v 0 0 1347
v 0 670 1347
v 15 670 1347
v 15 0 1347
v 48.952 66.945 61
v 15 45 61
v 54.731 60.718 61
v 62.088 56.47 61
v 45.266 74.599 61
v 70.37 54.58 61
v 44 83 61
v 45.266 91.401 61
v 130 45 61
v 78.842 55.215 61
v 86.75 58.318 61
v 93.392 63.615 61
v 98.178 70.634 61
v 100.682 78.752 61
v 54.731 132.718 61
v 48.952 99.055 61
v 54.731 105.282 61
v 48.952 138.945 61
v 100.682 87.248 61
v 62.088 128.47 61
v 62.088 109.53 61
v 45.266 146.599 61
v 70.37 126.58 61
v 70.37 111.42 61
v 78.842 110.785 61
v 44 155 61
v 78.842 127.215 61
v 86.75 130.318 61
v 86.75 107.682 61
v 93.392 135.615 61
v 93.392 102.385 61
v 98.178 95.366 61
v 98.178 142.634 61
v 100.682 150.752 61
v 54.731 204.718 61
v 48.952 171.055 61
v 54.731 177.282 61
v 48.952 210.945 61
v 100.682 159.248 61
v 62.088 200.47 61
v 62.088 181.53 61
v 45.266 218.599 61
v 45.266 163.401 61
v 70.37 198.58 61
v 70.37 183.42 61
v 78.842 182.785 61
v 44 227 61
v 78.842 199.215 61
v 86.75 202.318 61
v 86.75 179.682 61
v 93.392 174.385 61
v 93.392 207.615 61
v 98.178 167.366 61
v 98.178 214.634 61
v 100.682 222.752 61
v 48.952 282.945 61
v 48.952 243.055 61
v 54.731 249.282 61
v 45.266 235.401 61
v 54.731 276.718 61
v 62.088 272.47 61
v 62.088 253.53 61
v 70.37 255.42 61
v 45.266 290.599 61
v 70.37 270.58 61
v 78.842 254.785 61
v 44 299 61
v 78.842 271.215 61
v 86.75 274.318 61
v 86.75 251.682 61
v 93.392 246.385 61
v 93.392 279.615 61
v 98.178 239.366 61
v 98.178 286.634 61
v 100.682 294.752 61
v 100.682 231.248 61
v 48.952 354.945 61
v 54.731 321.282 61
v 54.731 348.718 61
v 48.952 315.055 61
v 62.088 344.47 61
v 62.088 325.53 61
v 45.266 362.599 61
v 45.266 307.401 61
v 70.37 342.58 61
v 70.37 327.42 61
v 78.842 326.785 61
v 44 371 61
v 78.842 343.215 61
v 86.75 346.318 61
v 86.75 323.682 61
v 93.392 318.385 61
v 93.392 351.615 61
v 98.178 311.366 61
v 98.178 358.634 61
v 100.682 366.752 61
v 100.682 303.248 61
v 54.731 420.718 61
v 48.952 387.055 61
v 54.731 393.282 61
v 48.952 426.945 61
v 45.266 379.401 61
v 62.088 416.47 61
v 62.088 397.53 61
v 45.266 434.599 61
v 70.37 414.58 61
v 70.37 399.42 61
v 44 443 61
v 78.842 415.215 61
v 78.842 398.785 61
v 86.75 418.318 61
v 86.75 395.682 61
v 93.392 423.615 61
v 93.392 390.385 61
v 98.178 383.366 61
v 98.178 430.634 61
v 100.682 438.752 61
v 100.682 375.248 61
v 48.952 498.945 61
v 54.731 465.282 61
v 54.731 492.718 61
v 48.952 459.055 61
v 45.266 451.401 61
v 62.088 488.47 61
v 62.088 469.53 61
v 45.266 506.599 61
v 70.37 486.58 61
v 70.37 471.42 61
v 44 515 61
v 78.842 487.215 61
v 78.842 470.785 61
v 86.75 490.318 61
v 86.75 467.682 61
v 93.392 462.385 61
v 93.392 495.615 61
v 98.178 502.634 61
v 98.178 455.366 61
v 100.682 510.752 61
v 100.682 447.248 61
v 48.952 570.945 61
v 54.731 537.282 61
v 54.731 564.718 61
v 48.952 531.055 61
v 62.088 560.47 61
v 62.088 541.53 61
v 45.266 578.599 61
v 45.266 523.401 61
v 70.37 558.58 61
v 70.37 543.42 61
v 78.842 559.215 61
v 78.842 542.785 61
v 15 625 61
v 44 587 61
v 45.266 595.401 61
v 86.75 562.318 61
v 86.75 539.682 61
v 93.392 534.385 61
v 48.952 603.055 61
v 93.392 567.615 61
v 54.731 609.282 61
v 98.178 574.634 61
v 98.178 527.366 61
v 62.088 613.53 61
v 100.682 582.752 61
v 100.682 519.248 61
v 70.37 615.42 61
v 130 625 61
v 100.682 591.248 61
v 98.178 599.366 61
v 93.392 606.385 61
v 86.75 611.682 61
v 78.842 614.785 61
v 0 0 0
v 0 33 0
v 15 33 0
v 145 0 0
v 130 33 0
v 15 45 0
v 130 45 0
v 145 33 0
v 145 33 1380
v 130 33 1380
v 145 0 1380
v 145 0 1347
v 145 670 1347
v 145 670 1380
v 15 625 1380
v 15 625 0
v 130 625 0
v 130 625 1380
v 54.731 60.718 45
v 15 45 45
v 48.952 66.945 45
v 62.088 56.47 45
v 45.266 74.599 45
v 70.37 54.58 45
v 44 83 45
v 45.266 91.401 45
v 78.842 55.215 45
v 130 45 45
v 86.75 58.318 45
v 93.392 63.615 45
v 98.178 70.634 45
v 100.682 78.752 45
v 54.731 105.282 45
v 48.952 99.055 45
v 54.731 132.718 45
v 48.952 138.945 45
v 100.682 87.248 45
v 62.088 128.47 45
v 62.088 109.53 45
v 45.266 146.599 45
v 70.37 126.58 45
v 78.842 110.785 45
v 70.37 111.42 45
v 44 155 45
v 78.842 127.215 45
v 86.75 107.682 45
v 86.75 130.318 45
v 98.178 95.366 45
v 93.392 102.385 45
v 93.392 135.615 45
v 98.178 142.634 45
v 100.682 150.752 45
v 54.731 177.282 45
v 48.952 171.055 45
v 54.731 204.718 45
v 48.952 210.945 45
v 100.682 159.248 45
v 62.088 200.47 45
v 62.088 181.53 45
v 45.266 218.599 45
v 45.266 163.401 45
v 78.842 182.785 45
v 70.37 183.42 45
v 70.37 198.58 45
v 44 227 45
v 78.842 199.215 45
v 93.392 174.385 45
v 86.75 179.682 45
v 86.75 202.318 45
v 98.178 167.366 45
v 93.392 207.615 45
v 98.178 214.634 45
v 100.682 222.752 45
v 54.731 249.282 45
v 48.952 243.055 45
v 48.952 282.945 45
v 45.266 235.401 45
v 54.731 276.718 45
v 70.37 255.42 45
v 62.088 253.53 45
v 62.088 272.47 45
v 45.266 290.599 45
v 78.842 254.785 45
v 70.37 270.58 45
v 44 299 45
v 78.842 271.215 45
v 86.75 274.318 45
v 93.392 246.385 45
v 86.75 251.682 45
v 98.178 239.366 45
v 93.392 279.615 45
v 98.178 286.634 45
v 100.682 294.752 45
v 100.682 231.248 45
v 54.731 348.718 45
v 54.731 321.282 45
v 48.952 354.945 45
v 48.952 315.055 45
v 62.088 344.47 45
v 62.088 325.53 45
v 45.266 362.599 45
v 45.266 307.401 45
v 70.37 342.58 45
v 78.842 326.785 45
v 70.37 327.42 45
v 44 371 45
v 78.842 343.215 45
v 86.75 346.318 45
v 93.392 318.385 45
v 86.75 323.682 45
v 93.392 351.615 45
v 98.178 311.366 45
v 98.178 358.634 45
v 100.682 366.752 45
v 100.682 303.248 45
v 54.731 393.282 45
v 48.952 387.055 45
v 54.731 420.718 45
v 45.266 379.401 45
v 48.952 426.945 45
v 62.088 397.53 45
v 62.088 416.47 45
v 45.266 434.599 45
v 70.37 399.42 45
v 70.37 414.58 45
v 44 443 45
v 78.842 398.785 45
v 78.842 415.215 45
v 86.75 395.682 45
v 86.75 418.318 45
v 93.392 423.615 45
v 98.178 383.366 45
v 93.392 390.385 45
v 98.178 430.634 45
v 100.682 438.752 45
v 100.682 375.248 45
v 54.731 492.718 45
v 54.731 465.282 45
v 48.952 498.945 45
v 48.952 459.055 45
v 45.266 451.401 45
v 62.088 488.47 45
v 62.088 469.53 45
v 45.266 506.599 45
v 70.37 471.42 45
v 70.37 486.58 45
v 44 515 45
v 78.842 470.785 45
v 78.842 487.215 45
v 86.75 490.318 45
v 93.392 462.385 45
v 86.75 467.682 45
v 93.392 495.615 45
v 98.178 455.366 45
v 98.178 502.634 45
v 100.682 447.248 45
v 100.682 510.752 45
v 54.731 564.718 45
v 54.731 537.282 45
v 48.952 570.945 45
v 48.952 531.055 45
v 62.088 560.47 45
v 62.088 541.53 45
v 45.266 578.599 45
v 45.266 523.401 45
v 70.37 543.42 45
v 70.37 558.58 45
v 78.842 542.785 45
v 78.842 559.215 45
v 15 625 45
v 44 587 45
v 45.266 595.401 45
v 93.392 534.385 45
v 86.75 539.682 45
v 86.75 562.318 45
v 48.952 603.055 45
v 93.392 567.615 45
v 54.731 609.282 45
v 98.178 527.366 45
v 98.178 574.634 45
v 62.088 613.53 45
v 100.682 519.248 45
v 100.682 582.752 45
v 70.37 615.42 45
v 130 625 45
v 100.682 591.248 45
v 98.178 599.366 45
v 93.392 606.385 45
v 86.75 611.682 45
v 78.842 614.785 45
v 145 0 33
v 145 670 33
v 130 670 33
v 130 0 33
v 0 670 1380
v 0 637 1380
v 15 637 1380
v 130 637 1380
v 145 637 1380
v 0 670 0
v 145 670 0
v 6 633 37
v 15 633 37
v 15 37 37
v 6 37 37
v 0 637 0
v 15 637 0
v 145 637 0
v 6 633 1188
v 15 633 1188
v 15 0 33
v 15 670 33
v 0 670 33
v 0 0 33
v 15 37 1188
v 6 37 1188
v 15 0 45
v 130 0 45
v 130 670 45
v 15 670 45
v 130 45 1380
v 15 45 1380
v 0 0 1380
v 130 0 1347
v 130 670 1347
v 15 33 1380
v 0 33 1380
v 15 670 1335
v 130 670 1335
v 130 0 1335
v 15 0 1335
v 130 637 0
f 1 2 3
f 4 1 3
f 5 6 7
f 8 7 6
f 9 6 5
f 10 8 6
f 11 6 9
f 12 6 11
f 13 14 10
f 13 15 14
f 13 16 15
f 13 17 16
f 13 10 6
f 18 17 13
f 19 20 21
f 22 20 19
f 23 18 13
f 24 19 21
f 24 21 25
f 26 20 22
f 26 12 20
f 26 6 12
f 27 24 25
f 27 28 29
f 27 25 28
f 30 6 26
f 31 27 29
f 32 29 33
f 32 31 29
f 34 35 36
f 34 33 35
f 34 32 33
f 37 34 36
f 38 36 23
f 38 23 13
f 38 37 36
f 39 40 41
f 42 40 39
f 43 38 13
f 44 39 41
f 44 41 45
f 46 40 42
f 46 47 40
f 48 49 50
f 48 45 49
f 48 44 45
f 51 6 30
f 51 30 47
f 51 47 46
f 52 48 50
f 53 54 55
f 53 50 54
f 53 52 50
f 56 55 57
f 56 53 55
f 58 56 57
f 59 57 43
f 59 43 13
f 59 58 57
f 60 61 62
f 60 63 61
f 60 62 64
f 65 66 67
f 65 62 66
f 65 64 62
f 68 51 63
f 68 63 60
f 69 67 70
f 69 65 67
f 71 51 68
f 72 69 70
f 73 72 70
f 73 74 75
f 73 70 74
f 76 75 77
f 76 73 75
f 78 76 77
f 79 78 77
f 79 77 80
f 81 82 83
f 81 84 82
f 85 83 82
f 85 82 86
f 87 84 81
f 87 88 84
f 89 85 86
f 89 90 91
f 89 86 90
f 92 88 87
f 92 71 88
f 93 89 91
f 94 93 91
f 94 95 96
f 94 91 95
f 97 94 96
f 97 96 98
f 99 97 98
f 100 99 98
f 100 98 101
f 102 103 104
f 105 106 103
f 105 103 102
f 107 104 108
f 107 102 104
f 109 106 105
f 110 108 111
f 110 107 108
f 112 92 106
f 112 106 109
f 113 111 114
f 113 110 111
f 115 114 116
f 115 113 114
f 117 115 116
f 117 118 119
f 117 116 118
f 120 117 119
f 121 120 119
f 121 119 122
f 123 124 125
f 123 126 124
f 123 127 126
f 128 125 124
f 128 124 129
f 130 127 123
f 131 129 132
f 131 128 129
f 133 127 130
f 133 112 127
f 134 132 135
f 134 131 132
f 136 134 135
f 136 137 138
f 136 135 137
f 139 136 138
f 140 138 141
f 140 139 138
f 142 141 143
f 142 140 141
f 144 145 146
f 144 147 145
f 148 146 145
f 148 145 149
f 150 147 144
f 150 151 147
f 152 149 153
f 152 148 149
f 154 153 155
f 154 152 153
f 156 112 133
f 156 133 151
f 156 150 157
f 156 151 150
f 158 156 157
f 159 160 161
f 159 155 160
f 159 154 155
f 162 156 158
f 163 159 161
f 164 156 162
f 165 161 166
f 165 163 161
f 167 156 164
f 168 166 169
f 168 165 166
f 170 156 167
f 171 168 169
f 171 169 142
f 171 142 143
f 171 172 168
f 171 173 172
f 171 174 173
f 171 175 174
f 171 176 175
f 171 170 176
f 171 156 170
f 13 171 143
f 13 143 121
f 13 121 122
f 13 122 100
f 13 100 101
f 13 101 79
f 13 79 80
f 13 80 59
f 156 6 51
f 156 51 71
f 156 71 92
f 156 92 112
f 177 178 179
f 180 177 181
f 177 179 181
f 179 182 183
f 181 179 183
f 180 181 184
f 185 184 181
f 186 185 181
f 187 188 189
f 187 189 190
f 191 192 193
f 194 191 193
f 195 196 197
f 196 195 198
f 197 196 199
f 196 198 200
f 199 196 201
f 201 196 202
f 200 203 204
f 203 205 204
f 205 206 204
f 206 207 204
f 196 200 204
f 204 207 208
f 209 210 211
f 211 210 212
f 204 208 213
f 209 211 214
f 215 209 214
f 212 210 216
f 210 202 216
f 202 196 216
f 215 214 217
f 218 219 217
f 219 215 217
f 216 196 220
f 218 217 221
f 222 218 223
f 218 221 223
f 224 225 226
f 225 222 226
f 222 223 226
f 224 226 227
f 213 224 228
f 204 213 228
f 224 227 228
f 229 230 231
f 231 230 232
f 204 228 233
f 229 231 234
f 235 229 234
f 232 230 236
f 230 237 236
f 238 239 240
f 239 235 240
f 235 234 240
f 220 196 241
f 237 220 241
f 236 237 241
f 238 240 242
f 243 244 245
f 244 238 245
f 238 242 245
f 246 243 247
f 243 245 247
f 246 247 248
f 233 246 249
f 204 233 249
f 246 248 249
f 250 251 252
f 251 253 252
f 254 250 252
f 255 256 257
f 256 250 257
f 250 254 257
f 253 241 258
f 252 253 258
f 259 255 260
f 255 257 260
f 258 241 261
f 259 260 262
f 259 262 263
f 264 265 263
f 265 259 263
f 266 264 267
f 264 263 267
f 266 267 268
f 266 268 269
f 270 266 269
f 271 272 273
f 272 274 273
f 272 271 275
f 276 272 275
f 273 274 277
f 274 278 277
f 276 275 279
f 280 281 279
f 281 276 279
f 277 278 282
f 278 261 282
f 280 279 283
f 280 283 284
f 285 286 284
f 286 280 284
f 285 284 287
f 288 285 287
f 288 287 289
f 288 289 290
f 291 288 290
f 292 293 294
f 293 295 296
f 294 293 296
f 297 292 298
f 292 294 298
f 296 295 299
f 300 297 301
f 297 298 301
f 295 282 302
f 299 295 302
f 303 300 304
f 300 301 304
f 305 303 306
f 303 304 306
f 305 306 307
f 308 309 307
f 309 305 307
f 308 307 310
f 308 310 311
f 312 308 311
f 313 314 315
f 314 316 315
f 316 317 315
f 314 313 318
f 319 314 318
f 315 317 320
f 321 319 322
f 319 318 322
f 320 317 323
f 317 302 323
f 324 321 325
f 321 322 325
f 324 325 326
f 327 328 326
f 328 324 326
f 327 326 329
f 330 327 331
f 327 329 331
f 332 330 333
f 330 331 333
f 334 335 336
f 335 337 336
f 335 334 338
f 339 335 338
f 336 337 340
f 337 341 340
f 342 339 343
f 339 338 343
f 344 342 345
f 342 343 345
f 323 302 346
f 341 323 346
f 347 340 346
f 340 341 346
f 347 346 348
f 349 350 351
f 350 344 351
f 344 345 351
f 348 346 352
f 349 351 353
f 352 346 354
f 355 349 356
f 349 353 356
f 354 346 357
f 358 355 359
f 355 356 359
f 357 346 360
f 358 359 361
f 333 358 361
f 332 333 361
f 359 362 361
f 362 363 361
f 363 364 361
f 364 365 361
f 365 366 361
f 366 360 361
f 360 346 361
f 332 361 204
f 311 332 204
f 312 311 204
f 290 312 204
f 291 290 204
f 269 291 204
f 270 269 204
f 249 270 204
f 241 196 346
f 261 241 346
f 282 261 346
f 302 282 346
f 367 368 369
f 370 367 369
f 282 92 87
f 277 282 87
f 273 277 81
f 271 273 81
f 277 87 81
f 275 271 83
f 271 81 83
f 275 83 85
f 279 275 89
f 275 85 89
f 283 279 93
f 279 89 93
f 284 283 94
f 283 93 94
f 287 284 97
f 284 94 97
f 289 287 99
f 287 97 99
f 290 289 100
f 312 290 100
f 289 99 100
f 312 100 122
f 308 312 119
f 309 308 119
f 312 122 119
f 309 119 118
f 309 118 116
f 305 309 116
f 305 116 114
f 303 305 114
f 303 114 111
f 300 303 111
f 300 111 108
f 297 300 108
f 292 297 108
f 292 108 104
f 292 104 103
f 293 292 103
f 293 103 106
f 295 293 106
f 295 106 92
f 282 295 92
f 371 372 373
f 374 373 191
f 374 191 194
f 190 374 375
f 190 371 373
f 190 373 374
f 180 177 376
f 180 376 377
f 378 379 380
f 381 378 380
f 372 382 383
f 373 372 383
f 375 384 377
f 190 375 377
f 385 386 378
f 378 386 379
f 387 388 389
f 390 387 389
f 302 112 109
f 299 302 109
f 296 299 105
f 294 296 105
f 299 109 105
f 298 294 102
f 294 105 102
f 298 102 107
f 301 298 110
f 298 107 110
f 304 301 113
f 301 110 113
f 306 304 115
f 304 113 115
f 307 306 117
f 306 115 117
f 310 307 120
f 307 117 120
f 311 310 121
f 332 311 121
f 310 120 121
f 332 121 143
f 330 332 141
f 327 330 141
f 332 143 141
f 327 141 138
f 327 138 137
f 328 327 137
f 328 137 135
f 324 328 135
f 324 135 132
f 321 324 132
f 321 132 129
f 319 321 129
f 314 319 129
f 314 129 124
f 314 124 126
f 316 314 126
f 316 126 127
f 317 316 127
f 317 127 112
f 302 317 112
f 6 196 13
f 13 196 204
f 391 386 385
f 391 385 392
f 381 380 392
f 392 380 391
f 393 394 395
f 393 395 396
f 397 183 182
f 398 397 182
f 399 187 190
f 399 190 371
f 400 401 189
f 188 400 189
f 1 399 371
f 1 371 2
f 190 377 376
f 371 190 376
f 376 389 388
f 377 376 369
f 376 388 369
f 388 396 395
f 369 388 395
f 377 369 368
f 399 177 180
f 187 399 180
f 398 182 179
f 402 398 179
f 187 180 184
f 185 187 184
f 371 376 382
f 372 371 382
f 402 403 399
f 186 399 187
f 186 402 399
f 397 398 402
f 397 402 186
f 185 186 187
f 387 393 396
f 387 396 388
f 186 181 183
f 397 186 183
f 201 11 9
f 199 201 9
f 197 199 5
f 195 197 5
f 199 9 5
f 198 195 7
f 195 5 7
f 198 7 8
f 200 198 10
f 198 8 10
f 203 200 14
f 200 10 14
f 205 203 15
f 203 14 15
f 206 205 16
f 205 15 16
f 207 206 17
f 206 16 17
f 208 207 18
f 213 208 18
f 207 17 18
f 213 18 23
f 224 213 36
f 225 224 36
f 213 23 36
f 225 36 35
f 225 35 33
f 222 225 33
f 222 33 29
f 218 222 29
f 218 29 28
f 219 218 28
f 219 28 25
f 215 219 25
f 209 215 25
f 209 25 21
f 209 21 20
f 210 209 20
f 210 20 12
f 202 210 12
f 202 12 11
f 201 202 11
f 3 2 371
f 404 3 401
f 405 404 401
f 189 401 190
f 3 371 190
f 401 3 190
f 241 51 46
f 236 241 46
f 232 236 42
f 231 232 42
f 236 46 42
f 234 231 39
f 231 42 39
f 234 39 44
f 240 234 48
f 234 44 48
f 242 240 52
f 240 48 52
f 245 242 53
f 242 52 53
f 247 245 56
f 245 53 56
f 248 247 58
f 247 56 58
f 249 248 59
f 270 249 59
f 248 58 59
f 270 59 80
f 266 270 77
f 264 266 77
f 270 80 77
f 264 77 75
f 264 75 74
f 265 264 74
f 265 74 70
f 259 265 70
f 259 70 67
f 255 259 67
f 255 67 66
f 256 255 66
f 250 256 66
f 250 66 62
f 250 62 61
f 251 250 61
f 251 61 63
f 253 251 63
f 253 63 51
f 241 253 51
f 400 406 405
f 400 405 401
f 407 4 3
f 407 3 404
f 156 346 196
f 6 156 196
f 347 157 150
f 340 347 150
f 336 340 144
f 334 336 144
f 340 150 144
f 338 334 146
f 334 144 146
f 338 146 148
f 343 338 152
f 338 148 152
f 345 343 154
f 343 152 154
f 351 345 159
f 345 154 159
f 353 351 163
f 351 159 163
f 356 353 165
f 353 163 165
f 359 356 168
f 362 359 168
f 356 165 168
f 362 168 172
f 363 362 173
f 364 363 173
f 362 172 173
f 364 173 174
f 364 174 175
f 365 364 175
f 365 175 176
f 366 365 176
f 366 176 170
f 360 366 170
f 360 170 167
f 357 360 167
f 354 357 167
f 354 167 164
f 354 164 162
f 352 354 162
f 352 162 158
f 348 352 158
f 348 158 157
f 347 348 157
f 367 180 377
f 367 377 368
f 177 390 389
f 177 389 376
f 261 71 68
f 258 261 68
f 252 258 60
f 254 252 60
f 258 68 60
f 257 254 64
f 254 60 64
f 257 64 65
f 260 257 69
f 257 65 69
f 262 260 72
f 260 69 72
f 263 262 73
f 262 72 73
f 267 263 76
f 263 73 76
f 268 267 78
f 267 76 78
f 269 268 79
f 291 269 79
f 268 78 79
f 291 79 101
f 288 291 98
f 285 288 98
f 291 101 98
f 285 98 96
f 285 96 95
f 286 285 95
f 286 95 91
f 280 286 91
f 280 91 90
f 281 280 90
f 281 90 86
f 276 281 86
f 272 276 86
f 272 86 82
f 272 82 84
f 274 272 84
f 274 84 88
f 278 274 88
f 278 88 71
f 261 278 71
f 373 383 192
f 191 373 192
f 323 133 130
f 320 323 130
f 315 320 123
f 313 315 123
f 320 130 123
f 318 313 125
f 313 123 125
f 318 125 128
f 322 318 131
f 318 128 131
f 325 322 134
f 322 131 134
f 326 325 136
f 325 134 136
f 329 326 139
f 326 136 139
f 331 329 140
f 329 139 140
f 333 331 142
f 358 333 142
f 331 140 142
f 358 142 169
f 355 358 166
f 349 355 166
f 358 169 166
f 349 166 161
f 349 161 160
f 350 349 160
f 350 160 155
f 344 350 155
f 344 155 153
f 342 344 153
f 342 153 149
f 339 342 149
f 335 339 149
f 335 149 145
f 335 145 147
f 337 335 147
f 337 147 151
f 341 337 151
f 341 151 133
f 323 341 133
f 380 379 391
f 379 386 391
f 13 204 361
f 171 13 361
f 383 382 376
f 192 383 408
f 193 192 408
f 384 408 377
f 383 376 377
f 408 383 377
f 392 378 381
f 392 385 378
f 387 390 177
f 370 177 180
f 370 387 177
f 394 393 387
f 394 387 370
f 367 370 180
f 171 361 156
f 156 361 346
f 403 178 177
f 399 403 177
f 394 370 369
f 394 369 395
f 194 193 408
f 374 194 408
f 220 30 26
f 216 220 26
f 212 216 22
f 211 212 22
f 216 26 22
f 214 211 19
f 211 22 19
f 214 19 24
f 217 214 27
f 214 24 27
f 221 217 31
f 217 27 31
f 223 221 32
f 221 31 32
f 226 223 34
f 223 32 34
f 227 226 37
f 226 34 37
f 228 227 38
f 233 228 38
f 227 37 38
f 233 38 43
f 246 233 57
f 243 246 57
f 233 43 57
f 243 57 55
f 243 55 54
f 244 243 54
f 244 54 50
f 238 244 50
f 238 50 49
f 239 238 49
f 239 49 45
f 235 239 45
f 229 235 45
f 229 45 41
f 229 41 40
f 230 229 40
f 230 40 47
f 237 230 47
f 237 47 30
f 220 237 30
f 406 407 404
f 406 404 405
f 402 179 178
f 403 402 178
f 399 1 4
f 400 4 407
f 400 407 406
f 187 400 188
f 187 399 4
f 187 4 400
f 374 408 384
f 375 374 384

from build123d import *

# Parameters (mm, degrees)
F1_DEPTH = 1380
F3_DEPTH = 670
F5_DEPTH = 16
F6_D     = 57
F7_W     = 596
F7_H     = 8
F7_H_2   = 1143
F8_DEPTH = 9


with BuildPart() as f1:
    # F0 (on Top) → F1 (new body)
    with BuildSketch(Plane.XY):
        Polygon((0, 33), (0, 0), (145, 0), (145, 33), (130, 33), (130, 45), (15, 45), (15, 33), align=None)
    extrude(amount=F1_DEPTH)


with BuildPart() as f1b:
    # F0 (on Top) → F1, piece 2 (new body)
    with BuildSketch(Plane.XY):
        Polygon((145, 670), (0, 670), (0, 637), (15, 637), (15, 625), (130, 625), (130, 637), (145, 637), align=None)
    extrude(amount=F1_DEPTH)


with BuildPart() as f3:
    # F2 (on face) → F3 (new body)
    with BuildSketch(Plane.XZ):
        Polygon((0, 1380), (0, 1347), (15, 1347), (15, 1335), (130, 1335), (130, 1347), (145, 1347), (145, 1380), align=None)
    extrude(amount=-F3_DEPTH)


with BuildPart() as f3b:
    # F2 (on face) → F3, piece 2 (new body)
    with BuildSketch(Plane.XZ):
        Polygon((0, 33), (0, 0), (145, 0), (145, 33), (130, 33), (130, 45), (15, 45), (15, 33), align=None)
    extrude(amount=-F3_DEPTH)


with BuildPart() as f5:
    # F4 (on face) → F5 (new body)
    with BuildSketch(Plane.XY.offset(45)):
        Polygon((130, 45), (130, 625), (72.5, 625), (72.5, 299), (72.5, 227), (72.5, 155), (72.5, 83), (72.5, 45), align=None)
        Polygon((72.5, 299), (72.5, 625), (15, 625), (15, 45), (72.5, 45), (72.5, 83), (72.5, 155), (72.5, 227), align=None)
    extrude(amount=F5_DEPTH)

    # F6 (through all)
    with Locations(Plane(origin=(0, 0, 45), x_dir=(1, 0, 0), z_dir=(0, 0, -1))):
        with Locations((72.5, -83), (72.5, -155), (72.5, -227), (72.5, -299), (72.5, -371), (72.5, -443), (72.5, -515), (72.5, -587)):
            Hole(F6_D / 2)


with BuildPart() as f8:
    # F7 (on face) → F8 (new body)
    with BuildSketch(Plane(origin=(15, 0, 0), x_dir=(0, -1, 0), z_dir=(-1, 0, 0))):
        with Locations((-335, 41)):
            Rectangle(F7_W, F7_H)
        with Locations((-335, 616.5)):
            Rectangle(F7_W, F7_H_2)
    extrude(amount=F8_DEPTH)


solid = Compound([f1.part, f1b.part, f3.part, f3b.part, f5.part, f8.part])
